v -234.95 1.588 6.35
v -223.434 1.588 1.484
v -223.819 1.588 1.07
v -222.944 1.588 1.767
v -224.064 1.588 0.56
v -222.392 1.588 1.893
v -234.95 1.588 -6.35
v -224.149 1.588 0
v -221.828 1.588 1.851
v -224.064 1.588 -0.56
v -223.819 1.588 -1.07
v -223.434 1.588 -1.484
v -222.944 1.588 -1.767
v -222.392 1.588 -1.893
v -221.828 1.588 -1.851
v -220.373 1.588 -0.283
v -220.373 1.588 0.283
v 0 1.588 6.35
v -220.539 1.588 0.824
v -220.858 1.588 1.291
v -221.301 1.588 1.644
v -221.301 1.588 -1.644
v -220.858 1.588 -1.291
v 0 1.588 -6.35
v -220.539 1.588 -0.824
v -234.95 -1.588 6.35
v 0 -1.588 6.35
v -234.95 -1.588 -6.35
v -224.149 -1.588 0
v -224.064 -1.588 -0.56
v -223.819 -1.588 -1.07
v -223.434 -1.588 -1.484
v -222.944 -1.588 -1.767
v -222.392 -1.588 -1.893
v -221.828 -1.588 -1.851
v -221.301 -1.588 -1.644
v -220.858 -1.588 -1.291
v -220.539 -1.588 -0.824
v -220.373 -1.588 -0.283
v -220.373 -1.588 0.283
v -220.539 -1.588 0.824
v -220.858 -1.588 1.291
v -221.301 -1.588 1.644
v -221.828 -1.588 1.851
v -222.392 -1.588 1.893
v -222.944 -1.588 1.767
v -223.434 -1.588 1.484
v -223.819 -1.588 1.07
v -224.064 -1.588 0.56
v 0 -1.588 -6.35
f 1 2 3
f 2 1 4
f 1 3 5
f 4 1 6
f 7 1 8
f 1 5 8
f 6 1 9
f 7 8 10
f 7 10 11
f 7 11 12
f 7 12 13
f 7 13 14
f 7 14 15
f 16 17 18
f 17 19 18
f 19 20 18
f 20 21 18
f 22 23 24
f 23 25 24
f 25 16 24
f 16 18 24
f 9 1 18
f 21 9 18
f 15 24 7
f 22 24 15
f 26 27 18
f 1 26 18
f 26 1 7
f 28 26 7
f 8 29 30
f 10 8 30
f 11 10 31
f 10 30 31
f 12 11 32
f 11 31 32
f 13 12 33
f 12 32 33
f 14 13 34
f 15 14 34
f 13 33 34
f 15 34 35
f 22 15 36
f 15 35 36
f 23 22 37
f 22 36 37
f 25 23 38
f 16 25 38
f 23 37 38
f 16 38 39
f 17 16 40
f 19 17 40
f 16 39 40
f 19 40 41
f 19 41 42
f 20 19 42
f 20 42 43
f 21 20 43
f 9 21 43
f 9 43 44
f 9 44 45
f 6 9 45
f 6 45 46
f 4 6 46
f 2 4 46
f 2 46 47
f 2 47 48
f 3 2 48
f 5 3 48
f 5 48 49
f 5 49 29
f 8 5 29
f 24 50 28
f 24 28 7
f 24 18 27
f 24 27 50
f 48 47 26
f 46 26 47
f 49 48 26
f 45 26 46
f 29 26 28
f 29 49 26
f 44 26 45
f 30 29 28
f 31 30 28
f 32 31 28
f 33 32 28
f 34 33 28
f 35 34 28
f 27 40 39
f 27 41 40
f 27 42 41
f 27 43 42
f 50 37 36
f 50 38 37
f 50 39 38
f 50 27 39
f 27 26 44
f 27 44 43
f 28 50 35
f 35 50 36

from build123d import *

# Parameters (mm, degrees)
SKETCH1_W             = 12.7
SKETCH1_H             = 3.175
BOSS_EXTRUDE1_DEPTH   = 234.95
F_6_CLEARANCE_HOLE1_D = 3.7973


with BuildPart() as part:
    # Sketch1 → Boss-Extrude1 (new body)
    with BuildSketch(Plane(origin=(0, 0, 0), x_dir=(0, 0, -1), z_dir=(1, 0, 0))):
        Rectangle(SKETCH1_W, SKETCH1_H)
    extrude(amount=-BOSS_EXTRUDE1_DEPTH)

    # #6 Clearance Hole1 (through all)
    with Locations(Plane(origin=(0, 1.5875, 0), x_dir=(1, 0, 0), z_dir=(0, 1, 0))):
        with Locations((-222.25, 0)):
            Hole(F_6_CLEARANCE_HOLE1_D / 2)


solid = part.part
